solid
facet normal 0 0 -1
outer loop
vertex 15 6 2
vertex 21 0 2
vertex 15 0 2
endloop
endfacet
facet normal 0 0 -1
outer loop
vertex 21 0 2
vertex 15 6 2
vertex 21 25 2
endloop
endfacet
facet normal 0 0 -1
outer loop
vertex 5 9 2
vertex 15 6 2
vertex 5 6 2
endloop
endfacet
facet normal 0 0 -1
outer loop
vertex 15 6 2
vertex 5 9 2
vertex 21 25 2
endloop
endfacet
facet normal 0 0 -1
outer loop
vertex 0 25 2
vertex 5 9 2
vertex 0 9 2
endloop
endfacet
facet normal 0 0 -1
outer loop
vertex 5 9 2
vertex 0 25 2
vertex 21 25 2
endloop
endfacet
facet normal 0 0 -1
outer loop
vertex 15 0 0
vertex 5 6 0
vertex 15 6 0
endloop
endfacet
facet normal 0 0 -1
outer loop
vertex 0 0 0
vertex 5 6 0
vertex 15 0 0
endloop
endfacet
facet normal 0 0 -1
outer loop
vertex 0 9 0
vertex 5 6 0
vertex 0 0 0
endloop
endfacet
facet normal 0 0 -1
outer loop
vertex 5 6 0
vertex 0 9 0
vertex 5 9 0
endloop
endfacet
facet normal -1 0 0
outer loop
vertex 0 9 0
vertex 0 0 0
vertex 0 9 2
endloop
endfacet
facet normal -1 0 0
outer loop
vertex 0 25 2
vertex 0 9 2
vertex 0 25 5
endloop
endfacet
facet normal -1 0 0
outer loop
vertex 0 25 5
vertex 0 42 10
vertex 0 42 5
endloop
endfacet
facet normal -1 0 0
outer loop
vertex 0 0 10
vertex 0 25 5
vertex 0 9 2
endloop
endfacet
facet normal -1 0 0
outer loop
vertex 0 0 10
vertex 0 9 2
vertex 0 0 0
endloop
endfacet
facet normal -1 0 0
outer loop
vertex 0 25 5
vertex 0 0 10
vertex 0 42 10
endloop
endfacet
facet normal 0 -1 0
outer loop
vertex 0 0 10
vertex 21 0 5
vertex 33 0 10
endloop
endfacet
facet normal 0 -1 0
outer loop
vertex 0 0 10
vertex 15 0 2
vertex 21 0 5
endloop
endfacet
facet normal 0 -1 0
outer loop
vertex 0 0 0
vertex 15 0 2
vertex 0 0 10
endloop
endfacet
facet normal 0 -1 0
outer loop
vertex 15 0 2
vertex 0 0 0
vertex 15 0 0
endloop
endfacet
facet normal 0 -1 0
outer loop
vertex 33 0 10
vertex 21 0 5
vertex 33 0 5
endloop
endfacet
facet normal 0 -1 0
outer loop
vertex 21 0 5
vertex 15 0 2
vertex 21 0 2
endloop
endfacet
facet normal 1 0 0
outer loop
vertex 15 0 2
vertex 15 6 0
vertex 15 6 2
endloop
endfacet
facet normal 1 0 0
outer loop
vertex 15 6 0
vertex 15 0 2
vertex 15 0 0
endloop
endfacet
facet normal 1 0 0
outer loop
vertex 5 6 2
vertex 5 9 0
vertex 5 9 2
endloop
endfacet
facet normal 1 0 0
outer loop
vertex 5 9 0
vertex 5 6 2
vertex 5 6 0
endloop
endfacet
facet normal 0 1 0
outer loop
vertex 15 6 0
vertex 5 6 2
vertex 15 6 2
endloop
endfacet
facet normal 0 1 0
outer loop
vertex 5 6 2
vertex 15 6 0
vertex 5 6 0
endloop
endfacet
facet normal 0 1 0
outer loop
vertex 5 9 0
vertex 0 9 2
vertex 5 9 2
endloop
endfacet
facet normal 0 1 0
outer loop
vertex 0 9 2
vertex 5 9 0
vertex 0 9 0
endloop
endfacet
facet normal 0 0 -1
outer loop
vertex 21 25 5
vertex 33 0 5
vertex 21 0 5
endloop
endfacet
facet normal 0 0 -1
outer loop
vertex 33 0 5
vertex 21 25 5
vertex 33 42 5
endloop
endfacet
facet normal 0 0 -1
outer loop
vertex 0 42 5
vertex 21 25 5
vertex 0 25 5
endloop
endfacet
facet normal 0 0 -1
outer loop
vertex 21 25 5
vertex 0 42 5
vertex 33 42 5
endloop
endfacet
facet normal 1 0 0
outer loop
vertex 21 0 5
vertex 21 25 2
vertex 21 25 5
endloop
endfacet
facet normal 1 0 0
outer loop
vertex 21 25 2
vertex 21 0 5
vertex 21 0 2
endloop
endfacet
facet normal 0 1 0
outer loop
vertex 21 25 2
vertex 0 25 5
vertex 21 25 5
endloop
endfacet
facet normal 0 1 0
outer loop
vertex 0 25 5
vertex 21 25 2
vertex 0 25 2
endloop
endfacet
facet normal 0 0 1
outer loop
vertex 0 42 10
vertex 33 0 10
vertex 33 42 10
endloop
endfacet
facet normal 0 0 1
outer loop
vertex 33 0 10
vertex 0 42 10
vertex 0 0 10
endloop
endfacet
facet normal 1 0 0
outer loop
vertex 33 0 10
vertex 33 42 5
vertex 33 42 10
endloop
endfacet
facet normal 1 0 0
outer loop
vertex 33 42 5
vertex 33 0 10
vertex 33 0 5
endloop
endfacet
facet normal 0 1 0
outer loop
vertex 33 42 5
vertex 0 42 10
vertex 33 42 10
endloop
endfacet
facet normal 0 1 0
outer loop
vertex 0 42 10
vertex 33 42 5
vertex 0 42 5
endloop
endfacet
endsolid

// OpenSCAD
translate([2.5, 1.5, 1.0]) color([0.25093266482213705, 0.560600218853524, 0.012436318829314397]) cube([5, 3, 2], center=true);
translate([7.5, 1.5, 1.0]) color([0.7415743774106636, 0.3359165544734606, 0.04569649356841665]) cube([5, 3, 2], center=true);
translate([12.5, 1.5, 1.0]) color([0.28088316421834825, 0.24013040782635398, 0.9531293398277989]) cube([5, 3, 2], center=true);
translate([2.5, 4.5, 1.0]) color([0.35222556151550743, 0.2878779148564, 0.35920119725374633]) cube([5, 3, 2], center=true);
translate([7.5, 4.5, 1.0]) color([0.9469058356578911, 0.6337478522492526, 0.6210768456186673]) cube([5, 3, 2], center=true);
translate([12.5, 4.5, 1.0]) color([0.7156193503014563, 0.38801723531250565, 0.4144179882772473]) cube([5, 3, 2], center=true);
translate([2.5, 7.5, 1.0]) color([0.650832862263345, 0.001524221856720187, 0.1923095412446758]) cube([5, 3, 2], center=true);
translate([3.5, 2.5, 3.5]) color([0.3344016906625016, 0.23941596018595857, 0.6373994011293003]) cube([7, 5, 3], center=true);
translate([10.5, 2.5, 3.5]) color([0.37864807032309444, 0.8754233917130172, 0.5681514209101919]) cube([7, 5, 3], center=true);
translate([17.5, 2.5, 3.5]) color([0.4144063966836443, 0.40226707511907955, 0.7018296239336754]) cube([7, 5, 3], center=true);
translate([3.5, 7.5, 3.5]) color([0.41822655329246605, 0.6621958889738174, 0.04677968595679827]) cube([7, 5, 3], center=true);
translate([10.5, 7.5, 3.5]) color([0.44535218971882984, 0.25922692344722276, 0.15768657212231085]) cube([7, 5, 3], center=true);
translate([17.5, 7.5, 3.5]) color([0.5275731301676146, 0.48726560106903205, 0.5614049256144269]) cube([7, 5, 3], center=true);
translate([3.5, 12.5, 3.5]) color([0.7554847672586825, 0.8838751542487009, 0.4945826703752868]) cube([7, 5, 3], center=true);
translate([10.5, 12.5, 3.5]) color([0.31205824641687296, 0.46689223535252355, 0.8090458573603624]) cube([7, 5, 3], center=true);
translate([17.5, 12.5, 3.5]) color([0.8750163314802711, 0.8124149323637591, 0.188001294050828]) cube([7, 5, 3], center=true);
translate([3.5, 17.5, 3.5]) color([0.9994203594553304, 0.6330887599183004, 0.08346705017572931]) cube([7, 5, 3], center=true);
translate([10.5, 17.5, 3.5]) color([0.7255543554613124, 0.9868214802051282, 0.40181682221254356]) cube([7, 5, 3], center=true);
translate([17.5, 17.5, 3.5]) color([0.6785150052419683, 0.31617713722134233, 0.2135246620646961]) cube([7, 5, 3], center=true);
translate([3.5, 22.5, 3.5]) color([0.7173241433110372, 0.0023575647193538884, 0.8227314105314157]) cube([7, 5, 3], center=true);
translate([10.5, 22.5, 3.5]) color([0.5283459768597928, 0.09778434180065931, 0.11890389478474583]) cube([7, 5, 3], center=true);
translate([17.5, 22.5, 3.5]) color([0.6492654248961536, 0.8736538239003423, 0.27998274332687256]) cube([7, 5, 3], center=true);
translate([5.5, 3.5, 7.5]) color([0.9785151867733981, 0.10018068906370903, 0.8539381095973382]) cube([11, 7, 5], center=true);
translate([16.5, 3.5, 7.5]) color([0.39669617733090445, 0.08134541676823415, 0.2747138434192621]) cube([11, 7, 5], center=true);
translate([27.5, 3.5, 7.5]) color([0.4529781848179143, 0.7923415311856522, 0.8613599036372361]) cube([11, 7, 5], center=true);
translate([5.5, 10.5, 7.5]) color([0.13342055420254906, 0.5208655284141989, 0.6507832381497373]) cube([11, 7, 5], center=true);
translate([16.5, 10.5, 7.5]) color([0.3470530145996015, 0.8718638357105861, 0.27840981521636055]) cube([11, 7, 5], center=true);
translate([27.5, 10.5, 7.5]) color([0.01857432754559518, 0.0406632736752609, 0.6809967701112433]) cube([11, 7, 5], center=true);
translate([5.5, 17.5, 7.5]) color([0.5583557360970469, 0.946502554169996, 0.9384387997349186]) cube([11, 7, 5], center=true);
translate([16.5, 17.5, 7.5]) color([0.9098511774051025, 0.04200453196734122, 0.7491348233908631]) cube([11, 7, 5], center=true);
translate([27.5, 17.5, 7.5]) color([0.7013248175948597, 0.6553618646747296, 0.7123576525162417]) cube([11, 7, 5], center=true);
translate([5.5, 24.5, 7.5]) color([0.9027101506193307, 0.6401411997932241, 0.372449262972256]) cube([11, 7, 5], center=true);
translate([16.5, 24.5, 7.5]) color([0.5379287837318205, 0.20784410369082473, 0.5871255046951435]) cube([11, 7, 5], center=true);
translate([27.5, 24.5, 7.5]) color([0.008897082049078797, 0.15102317386398778, 0.3334083880298664]) cube([11, 7, 5], center=true);
translate([5.5, 31.5, 7.5]) color([0.7896231589257826, 0.7184994227715396, 0.3382559700266786]) cube([11, 7, 5], center=true);
translate([16.5, 31.5, 7.5]) color([0.6205381083165517, 0.041202949506209285, 0.16386054567557595]) cube([11, 7, 5], center=true);
translate([27.5, 31.5, 7.5]) color([0.9819140701253054, 0.28953085363586695, 0.39479198298829066]) cube([11, 7, 5], center=true);
translate([5.5, 38.5, 7.5]) color([0.5484842965725134, 0.29340700145733656, 0.47806466915102097]) cube([11, 7, 5], center=true);
translate([16.5, 38.5, 7.5]) color([0.2397060836386239, 0.04825636228829444, 0.17958684904155564]) cube([11, 7, 5], center=true);
translate([27.5, 38.5, 7.5]) color([0.5230502317000981, 0.07086288409434749, 0.4031691464450935]) cube([11, 7, 5], center=true);
